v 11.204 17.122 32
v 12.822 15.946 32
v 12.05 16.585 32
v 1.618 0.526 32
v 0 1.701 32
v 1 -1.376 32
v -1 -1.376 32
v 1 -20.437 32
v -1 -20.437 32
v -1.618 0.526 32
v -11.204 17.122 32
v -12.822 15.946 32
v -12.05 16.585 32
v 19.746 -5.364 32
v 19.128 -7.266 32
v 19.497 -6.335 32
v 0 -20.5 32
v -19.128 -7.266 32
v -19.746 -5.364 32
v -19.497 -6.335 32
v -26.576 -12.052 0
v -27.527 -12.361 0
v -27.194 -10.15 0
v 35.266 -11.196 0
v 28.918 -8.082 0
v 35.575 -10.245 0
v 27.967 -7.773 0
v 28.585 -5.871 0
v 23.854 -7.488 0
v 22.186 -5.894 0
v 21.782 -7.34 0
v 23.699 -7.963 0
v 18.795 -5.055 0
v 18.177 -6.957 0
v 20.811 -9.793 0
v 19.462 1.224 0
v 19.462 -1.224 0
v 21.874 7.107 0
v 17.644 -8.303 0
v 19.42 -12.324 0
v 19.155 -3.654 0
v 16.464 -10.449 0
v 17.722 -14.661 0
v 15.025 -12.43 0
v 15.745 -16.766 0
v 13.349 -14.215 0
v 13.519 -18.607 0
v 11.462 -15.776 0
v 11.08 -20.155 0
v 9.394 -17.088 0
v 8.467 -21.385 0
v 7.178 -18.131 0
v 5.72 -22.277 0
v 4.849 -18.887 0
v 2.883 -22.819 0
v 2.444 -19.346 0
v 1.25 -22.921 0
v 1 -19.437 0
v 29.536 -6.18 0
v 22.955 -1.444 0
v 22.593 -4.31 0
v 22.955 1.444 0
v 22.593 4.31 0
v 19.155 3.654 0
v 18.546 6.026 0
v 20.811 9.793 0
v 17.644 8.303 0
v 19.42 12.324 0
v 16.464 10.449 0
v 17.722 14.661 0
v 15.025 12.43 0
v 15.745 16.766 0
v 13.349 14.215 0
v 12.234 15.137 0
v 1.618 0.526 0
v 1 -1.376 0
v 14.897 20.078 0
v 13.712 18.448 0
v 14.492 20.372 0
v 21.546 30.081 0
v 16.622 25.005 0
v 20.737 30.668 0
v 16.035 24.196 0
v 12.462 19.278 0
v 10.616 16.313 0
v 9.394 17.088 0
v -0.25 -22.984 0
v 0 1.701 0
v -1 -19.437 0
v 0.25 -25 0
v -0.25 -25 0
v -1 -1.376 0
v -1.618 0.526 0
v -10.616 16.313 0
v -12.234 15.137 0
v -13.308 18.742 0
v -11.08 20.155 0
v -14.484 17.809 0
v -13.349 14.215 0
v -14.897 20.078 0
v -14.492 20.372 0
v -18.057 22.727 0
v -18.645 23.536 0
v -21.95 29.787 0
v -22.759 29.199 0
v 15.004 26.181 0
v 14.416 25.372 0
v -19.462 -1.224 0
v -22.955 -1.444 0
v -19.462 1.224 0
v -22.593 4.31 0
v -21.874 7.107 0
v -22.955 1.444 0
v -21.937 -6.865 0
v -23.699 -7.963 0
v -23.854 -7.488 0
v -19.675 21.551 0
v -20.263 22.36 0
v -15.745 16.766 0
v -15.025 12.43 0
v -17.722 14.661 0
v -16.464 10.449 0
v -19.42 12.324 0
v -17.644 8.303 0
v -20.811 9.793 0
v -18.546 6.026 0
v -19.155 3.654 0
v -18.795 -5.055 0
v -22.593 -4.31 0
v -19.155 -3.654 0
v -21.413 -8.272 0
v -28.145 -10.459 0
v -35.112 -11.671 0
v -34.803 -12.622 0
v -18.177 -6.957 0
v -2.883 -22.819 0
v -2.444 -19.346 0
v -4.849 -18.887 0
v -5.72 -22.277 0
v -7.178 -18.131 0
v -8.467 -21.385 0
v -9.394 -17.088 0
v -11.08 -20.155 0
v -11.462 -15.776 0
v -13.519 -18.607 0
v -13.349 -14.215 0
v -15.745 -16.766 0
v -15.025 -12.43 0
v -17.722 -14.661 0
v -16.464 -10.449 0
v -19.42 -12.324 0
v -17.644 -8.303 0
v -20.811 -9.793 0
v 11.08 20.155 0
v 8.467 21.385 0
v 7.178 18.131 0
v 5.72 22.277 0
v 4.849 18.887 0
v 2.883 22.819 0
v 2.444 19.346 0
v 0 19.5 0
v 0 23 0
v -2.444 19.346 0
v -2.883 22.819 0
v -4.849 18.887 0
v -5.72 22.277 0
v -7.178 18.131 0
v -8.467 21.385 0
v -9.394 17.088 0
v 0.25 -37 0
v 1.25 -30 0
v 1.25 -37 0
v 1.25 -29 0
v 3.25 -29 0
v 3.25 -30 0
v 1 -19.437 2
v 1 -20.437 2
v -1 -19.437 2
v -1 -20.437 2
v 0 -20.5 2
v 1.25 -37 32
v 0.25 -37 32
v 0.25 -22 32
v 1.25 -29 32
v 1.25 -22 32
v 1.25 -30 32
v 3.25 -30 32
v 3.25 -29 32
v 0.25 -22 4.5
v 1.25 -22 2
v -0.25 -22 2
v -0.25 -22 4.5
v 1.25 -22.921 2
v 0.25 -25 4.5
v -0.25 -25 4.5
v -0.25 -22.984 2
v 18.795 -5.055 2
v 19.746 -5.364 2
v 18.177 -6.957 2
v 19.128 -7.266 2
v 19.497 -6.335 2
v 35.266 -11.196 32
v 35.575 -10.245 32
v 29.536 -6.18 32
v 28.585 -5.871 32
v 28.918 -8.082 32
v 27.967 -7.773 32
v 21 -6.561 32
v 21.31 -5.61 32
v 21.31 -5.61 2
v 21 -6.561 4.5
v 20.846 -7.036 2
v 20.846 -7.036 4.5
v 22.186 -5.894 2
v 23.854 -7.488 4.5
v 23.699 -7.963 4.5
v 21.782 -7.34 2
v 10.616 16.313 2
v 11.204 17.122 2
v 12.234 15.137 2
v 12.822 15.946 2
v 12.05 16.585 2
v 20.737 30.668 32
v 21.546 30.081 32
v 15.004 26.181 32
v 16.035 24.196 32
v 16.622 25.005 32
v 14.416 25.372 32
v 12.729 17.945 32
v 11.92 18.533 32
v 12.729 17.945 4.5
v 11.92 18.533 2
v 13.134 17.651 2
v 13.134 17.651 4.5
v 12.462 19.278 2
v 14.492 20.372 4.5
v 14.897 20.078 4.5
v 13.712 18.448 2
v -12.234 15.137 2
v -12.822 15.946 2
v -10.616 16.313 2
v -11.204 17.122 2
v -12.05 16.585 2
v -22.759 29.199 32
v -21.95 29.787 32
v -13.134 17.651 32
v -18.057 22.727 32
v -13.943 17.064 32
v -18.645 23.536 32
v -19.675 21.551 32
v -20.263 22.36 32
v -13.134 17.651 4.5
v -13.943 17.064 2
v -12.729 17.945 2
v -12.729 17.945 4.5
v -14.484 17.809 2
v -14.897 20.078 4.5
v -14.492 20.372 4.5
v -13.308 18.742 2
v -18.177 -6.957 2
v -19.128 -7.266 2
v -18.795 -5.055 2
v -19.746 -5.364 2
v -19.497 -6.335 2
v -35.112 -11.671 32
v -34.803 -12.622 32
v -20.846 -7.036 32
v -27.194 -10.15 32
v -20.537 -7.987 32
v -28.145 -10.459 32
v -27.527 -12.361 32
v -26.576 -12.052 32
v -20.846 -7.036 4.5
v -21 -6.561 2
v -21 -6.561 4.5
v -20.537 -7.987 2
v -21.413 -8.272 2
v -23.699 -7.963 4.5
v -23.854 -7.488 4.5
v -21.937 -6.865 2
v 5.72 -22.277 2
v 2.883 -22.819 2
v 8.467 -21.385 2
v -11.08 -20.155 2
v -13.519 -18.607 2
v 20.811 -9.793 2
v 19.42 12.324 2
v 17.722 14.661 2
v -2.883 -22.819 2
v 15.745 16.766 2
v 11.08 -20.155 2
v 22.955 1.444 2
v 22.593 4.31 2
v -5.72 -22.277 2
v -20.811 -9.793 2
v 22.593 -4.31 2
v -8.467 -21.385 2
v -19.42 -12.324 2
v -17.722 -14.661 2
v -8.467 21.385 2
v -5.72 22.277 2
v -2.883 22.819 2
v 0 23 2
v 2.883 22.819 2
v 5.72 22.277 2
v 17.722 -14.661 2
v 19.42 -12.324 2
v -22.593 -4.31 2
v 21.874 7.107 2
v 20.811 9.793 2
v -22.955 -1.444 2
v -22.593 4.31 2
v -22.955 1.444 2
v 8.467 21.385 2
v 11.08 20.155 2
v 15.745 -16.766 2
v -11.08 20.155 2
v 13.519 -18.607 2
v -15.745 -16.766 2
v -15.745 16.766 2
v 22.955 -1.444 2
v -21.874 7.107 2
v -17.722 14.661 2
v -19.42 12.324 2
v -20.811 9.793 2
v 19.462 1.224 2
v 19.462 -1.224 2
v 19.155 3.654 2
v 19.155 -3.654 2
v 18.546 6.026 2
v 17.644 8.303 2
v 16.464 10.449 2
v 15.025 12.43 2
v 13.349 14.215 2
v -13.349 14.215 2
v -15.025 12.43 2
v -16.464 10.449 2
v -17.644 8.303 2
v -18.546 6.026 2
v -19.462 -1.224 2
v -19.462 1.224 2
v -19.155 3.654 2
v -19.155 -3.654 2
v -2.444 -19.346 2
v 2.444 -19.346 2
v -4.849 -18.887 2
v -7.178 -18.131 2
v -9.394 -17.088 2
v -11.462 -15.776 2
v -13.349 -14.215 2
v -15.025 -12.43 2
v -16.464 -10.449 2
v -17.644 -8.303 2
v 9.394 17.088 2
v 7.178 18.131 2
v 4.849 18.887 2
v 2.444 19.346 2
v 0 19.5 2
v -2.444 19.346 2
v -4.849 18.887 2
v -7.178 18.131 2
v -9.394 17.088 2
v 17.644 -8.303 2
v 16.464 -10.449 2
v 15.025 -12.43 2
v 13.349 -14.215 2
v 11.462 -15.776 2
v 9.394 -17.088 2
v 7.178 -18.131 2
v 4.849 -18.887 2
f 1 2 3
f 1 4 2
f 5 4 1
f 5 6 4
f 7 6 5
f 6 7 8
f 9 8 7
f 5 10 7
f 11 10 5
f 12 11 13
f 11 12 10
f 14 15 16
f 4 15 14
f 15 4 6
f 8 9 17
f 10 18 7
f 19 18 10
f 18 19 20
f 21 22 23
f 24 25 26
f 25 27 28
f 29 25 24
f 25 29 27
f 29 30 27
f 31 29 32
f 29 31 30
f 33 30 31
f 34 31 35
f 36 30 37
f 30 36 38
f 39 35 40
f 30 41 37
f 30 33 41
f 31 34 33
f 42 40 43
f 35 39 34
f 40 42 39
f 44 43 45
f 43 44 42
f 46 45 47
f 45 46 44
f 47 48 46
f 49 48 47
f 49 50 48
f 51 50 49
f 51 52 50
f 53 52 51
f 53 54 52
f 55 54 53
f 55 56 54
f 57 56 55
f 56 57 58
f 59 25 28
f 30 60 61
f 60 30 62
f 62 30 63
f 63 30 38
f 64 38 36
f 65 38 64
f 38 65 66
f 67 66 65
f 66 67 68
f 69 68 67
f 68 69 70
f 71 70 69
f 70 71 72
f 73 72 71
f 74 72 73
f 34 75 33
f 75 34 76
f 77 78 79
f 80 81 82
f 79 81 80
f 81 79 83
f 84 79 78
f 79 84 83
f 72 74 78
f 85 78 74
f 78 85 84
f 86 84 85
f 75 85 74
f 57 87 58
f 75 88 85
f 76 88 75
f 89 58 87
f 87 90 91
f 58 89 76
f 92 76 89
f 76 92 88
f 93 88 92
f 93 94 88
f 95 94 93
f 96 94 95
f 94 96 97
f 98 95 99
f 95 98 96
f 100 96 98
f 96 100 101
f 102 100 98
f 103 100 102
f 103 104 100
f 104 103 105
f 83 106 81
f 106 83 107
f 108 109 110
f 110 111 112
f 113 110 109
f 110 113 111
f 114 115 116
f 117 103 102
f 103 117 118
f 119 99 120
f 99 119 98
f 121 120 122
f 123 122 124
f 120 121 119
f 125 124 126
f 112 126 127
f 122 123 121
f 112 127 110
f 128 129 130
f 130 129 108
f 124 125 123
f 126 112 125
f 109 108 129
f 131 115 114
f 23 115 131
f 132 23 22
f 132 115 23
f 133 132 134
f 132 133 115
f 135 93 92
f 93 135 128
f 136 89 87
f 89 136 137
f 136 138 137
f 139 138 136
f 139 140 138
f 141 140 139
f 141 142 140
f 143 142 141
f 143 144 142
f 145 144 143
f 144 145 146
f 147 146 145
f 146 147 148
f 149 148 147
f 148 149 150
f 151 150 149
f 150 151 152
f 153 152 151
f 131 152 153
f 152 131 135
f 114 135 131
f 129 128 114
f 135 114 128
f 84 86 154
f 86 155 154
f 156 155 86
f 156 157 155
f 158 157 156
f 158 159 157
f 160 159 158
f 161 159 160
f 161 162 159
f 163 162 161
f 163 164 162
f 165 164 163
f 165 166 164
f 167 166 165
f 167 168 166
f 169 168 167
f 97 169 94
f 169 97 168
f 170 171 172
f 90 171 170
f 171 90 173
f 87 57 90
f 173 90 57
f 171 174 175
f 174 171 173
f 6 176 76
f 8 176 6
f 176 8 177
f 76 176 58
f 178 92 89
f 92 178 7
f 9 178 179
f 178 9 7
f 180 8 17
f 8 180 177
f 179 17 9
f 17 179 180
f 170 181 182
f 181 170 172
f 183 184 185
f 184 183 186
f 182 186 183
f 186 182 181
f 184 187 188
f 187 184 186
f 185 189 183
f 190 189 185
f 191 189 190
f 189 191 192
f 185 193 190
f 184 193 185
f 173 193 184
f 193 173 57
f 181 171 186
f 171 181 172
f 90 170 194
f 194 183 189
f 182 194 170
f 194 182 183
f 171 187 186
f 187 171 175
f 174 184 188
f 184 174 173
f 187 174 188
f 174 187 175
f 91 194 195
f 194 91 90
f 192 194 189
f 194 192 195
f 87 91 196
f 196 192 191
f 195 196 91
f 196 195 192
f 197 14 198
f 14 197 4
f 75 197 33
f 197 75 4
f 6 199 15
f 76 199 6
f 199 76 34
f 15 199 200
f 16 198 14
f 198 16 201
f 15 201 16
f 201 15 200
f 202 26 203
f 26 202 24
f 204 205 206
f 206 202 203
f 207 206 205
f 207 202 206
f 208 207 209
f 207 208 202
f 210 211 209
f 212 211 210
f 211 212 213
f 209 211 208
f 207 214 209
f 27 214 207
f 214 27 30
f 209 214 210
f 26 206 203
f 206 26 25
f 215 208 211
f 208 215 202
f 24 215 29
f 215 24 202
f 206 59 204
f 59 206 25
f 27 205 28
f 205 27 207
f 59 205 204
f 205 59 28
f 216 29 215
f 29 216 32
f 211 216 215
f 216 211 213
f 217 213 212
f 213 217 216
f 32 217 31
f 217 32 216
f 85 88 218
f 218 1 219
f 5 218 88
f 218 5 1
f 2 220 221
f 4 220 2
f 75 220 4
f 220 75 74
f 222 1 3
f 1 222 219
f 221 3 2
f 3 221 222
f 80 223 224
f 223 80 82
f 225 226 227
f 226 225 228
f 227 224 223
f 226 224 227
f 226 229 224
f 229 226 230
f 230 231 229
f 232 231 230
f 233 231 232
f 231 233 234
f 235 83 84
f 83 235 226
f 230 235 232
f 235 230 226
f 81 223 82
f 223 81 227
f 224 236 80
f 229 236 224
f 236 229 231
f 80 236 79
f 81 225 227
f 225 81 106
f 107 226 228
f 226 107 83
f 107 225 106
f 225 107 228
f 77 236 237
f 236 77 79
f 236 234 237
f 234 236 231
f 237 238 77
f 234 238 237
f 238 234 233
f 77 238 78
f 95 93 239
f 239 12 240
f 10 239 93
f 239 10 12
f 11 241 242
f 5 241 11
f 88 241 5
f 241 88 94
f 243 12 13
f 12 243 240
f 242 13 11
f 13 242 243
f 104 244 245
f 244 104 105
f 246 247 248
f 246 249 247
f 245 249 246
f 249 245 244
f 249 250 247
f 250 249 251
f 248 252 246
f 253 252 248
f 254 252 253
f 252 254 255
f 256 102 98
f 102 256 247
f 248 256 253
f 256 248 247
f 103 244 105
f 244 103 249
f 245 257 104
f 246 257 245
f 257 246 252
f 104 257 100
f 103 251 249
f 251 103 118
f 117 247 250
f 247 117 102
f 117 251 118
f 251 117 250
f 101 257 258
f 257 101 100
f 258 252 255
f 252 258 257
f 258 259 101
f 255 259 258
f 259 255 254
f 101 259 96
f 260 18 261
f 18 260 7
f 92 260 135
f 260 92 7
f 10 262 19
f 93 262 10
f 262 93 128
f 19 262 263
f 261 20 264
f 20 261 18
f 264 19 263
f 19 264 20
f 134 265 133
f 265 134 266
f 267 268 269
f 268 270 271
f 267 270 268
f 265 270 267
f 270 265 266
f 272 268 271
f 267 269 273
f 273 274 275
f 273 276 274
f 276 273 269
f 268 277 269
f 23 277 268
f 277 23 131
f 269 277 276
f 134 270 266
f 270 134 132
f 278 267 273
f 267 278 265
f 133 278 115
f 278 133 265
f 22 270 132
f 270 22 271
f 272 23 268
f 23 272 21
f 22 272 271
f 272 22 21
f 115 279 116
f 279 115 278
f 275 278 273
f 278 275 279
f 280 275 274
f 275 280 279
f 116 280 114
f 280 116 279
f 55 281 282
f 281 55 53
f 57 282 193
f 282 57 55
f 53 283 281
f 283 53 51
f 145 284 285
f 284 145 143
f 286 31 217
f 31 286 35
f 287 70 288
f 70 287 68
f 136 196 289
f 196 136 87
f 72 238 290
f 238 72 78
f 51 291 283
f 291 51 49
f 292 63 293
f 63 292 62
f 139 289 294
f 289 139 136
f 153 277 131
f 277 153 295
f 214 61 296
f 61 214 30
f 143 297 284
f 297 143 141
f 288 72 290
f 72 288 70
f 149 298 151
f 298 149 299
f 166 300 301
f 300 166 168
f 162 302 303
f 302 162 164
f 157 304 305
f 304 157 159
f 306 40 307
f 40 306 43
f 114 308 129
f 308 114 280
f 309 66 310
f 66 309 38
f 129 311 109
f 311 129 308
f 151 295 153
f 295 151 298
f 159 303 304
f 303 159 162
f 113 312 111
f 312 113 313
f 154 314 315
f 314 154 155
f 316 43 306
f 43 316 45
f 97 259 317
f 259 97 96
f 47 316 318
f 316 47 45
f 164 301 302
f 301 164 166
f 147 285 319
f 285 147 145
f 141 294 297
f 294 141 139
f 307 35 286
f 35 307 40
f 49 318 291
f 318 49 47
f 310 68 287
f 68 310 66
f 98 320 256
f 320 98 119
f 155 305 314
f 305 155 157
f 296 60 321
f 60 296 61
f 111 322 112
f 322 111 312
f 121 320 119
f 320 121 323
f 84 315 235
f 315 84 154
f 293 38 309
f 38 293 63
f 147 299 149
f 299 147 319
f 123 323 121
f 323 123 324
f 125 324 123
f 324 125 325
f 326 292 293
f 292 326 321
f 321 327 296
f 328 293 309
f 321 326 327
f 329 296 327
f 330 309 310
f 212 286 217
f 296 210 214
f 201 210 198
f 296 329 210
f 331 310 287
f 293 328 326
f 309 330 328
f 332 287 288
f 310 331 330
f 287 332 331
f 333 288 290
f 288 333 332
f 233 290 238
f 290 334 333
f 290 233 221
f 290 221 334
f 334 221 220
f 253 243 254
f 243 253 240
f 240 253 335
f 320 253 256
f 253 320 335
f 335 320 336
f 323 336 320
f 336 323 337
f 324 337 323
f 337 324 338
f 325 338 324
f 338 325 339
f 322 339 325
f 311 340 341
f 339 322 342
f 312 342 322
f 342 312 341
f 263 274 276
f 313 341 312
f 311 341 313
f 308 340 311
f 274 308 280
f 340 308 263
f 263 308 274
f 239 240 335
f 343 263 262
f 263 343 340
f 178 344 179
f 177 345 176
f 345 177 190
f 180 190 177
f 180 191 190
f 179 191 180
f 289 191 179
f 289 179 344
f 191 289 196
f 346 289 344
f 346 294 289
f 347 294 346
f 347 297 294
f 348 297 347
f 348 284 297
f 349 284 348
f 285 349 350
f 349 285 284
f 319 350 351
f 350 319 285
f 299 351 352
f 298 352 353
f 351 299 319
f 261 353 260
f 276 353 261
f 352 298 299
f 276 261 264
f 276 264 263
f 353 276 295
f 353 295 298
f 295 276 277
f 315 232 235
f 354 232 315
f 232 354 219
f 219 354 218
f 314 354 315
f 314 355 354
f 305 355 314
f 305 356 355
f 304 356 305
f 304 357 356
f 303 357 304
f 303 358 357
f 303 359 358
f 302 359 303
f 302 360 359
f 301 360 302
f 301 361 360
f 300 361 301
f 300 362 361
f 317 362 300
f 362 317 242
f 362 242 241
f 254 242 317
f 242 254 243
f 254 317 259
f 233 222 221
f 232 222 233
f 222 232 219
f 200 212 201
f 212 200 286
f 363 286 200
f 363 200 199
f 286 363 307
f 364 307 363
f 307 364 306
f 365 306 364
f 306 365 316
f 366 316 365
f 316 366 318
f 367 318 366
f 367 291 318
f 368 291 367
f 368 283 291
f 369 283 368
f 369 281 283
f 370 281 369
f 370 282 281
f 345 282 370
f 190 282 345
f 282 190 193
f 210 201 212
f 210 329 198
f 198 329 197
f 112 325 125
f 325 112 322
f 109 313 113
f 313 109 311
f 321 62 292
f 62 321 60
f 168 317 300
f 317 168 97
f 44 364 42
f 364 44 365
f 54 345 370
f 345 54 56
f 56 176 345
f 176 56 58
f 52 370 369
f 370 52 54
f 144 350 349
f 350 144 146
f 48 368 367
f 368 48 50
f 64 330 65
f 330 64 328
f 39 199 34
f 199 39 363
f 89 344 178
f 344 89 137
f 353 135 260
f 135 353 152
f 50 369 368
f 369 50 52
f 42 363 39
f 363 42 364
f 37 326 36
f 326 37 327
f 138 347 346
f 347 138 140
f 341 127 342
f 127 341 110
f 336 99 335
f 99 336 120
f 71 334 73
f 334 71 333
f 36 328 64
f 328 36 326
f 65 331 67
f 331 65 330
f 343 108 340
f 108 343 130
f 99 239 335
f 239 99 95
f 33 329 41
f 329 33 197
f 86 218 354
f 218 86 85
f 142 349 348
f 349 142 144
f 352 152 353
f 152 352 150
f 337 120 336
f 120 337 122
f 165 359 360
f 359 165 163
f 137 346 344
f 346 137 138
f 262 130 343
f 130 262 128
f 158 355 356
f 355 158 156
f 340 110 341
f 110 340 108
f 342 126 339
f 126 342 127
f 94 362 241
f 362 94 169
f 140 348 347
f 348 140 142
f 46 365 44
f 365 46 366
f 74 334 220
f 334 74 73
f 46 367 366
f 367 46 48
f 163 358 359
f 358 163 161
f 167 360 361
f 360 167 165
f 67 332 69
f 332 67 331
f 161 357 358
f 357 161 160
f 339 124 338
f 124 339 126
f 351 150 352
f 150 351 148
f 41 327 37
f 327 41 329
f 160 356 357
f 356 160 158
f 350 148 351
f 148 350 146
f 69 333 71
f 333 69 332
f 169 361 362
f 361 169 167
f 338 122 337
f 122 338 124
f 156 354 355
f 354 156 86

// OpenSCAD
/*
 * Parametric Rocket Fin Guide
 *
 * by Alex Franke (CodeCreations), Jun 2012
 * http://www.theFrankes.com
 * 
 * Licenced under Creative Commons Attribution - Non-Commercial - Share Alike 3.0 
 * 
 * INSTRUCTIONS: Choose some values in the "User-defined values" section, render, print, smile
 *     broadly, share with friends, and send the author a few bottles of your favorite beer. 
 * 
 * v2.00, Jul 2, 2012: Added sleeve option for adding fins in middle of tube
 * v1.00, Jun 30, 2012: Initial release. 
 *
 */

/////////////////////////////////////////////////////////////////////////////
// User-defined values... 
/////////////////////////////////////////////////////////////////////////////

// Rocket Parameters

tubeOD              = 42;    // Outer diameter of the tube (rocket body)
tubeID              = 41;    // Inner diameter of the tube (rocket body)


// Fin Parameters
//      The fins are usually glued to the body of the rocket, near or at the bottom. Use 
//   finQty to specify one of more values indicating the number of fin supports to render.  
//   Setting finThickness is not critical, but will allow more perfect alignment. 
//      Somtimes you might want to add fins in different places (other than just the bottom).
//   In this case, set the baseThickness to a value that is sufficient for a stable fit, 
//   and set the sleeveOnly option to true. This will allow you to slide the guide onto 
//   the body of the rocket. 

finQty              = [5];   // One of more values specifying the number of fins
finThickness        = 0.5;   // Thickness of the fin material 
finHeight           = 15;    // The height of the fin supports, away from the rocket body
finLength           = 30;    // The length of the fin supports, along the rocket body
finElevation        = 2.5;   // The distance from the bottom that the fins should attach
finStandoff         = 2;     // Distance of fin supports from rocket body (room for glue)
finSupportThickness = 1;     // The thickness of the fin support material
finLedgeThickness   = 3;     // The thickness of the ledge used to vertically position the fin
finSpineLength      = 2;     // The length of the fin support rib 

tubeGuideThickness  = 2;     // The thickness of the structure that holds the tube
baseThickness       = 2;     // The thickness of the base of the jig

sleeveOnly          = false; // Set to true 

// Quality Parameters: 

$fn                 = 50;   // Default quality for most circle parts. 


/////////////////////////////////////////////////////////////////////////////
// Calculated values... 
/////////////////////////////////////////////////////////////////////////////

// Let's get some basic math out of the way first.
// ...what? No math? Well, maybe next time... 


/////////////////////////////////////////////////////////////////////////////
// Render the object...  
/////////////////////////////////////////////////////////////////////////////

rotate([0,0,-90]) // Rotate for printing with front-mounted fan
	finGuide();


/////////////////////////////////////////////////////////////////////////////
// Modules... 
/////////////////////////////////////////////////////////////////////////////

module finGuide() {

	difference() {
		union() {
			translate([0,0,(finLength+baseThickness)/2]) 
				fins();
			base(); 
		}
		
		if ( sleeveOnly ) 
			translate([0,0,-0.5]) 
				cylinder( r=tubeOD/2, h=finLength+baseThickness+1 ); 
	}
}

module base() {
	translate([0,0,baseThickness/2]) 
		tube( tubeOD+finStandoff+2, tubeID -2, baseThickness );
}

module fins() {
	for(set=finQty) {
		for(i=[0:set-1]) {
			rotate([0,0,i*360/set]) {
				innerStructure();
				fin();	
			}
		}
	}
}

module innerStructure() {
	intersection() {
		translate([tubeID/2/2,0, 0]) 
			cube([tubeID/2, tubeGuideThickness, finLength+baseThickness], center=true);
		cylinder( r=tubeID/2, h=finLength+baseThickness+1, center=true);
	}
}

module fin() {
	union() {
		// fin
		translate([	(tubeOD+finHeight+finStandoff)/2,
					(finSupportThickness+finThickness)/2, 
					0 ])
			cube([finHeight, finSupportThickness, finLength+baseThickness], center=true);

		// spine 
		translate([	(tubeOD+finHeight+finStandoff)/2,
					(finSpineLength+finThickness)/2 + finSupportThickness, 
					0 ])
			cube([finSupportThickness, finSpineLength, finLength+baseThickness], center=true);

		// elevation 
		translate([	(tubeOD+finLedgeThickness+finStandoff)/2,
					0,
					-(finLength+baseThickness)/2+(finElevation+baseThickness)/2	])
			cube([finLedgeThickness, finThickness, finElevation+baseThickness], center=true);
		
	}
}

module tube( od, id, height ) {
	difference() {
		cylinder(r=od/2, h=height, center=true);
		cylinder(r=id/2, h=height+1, center=true);
	}
}
